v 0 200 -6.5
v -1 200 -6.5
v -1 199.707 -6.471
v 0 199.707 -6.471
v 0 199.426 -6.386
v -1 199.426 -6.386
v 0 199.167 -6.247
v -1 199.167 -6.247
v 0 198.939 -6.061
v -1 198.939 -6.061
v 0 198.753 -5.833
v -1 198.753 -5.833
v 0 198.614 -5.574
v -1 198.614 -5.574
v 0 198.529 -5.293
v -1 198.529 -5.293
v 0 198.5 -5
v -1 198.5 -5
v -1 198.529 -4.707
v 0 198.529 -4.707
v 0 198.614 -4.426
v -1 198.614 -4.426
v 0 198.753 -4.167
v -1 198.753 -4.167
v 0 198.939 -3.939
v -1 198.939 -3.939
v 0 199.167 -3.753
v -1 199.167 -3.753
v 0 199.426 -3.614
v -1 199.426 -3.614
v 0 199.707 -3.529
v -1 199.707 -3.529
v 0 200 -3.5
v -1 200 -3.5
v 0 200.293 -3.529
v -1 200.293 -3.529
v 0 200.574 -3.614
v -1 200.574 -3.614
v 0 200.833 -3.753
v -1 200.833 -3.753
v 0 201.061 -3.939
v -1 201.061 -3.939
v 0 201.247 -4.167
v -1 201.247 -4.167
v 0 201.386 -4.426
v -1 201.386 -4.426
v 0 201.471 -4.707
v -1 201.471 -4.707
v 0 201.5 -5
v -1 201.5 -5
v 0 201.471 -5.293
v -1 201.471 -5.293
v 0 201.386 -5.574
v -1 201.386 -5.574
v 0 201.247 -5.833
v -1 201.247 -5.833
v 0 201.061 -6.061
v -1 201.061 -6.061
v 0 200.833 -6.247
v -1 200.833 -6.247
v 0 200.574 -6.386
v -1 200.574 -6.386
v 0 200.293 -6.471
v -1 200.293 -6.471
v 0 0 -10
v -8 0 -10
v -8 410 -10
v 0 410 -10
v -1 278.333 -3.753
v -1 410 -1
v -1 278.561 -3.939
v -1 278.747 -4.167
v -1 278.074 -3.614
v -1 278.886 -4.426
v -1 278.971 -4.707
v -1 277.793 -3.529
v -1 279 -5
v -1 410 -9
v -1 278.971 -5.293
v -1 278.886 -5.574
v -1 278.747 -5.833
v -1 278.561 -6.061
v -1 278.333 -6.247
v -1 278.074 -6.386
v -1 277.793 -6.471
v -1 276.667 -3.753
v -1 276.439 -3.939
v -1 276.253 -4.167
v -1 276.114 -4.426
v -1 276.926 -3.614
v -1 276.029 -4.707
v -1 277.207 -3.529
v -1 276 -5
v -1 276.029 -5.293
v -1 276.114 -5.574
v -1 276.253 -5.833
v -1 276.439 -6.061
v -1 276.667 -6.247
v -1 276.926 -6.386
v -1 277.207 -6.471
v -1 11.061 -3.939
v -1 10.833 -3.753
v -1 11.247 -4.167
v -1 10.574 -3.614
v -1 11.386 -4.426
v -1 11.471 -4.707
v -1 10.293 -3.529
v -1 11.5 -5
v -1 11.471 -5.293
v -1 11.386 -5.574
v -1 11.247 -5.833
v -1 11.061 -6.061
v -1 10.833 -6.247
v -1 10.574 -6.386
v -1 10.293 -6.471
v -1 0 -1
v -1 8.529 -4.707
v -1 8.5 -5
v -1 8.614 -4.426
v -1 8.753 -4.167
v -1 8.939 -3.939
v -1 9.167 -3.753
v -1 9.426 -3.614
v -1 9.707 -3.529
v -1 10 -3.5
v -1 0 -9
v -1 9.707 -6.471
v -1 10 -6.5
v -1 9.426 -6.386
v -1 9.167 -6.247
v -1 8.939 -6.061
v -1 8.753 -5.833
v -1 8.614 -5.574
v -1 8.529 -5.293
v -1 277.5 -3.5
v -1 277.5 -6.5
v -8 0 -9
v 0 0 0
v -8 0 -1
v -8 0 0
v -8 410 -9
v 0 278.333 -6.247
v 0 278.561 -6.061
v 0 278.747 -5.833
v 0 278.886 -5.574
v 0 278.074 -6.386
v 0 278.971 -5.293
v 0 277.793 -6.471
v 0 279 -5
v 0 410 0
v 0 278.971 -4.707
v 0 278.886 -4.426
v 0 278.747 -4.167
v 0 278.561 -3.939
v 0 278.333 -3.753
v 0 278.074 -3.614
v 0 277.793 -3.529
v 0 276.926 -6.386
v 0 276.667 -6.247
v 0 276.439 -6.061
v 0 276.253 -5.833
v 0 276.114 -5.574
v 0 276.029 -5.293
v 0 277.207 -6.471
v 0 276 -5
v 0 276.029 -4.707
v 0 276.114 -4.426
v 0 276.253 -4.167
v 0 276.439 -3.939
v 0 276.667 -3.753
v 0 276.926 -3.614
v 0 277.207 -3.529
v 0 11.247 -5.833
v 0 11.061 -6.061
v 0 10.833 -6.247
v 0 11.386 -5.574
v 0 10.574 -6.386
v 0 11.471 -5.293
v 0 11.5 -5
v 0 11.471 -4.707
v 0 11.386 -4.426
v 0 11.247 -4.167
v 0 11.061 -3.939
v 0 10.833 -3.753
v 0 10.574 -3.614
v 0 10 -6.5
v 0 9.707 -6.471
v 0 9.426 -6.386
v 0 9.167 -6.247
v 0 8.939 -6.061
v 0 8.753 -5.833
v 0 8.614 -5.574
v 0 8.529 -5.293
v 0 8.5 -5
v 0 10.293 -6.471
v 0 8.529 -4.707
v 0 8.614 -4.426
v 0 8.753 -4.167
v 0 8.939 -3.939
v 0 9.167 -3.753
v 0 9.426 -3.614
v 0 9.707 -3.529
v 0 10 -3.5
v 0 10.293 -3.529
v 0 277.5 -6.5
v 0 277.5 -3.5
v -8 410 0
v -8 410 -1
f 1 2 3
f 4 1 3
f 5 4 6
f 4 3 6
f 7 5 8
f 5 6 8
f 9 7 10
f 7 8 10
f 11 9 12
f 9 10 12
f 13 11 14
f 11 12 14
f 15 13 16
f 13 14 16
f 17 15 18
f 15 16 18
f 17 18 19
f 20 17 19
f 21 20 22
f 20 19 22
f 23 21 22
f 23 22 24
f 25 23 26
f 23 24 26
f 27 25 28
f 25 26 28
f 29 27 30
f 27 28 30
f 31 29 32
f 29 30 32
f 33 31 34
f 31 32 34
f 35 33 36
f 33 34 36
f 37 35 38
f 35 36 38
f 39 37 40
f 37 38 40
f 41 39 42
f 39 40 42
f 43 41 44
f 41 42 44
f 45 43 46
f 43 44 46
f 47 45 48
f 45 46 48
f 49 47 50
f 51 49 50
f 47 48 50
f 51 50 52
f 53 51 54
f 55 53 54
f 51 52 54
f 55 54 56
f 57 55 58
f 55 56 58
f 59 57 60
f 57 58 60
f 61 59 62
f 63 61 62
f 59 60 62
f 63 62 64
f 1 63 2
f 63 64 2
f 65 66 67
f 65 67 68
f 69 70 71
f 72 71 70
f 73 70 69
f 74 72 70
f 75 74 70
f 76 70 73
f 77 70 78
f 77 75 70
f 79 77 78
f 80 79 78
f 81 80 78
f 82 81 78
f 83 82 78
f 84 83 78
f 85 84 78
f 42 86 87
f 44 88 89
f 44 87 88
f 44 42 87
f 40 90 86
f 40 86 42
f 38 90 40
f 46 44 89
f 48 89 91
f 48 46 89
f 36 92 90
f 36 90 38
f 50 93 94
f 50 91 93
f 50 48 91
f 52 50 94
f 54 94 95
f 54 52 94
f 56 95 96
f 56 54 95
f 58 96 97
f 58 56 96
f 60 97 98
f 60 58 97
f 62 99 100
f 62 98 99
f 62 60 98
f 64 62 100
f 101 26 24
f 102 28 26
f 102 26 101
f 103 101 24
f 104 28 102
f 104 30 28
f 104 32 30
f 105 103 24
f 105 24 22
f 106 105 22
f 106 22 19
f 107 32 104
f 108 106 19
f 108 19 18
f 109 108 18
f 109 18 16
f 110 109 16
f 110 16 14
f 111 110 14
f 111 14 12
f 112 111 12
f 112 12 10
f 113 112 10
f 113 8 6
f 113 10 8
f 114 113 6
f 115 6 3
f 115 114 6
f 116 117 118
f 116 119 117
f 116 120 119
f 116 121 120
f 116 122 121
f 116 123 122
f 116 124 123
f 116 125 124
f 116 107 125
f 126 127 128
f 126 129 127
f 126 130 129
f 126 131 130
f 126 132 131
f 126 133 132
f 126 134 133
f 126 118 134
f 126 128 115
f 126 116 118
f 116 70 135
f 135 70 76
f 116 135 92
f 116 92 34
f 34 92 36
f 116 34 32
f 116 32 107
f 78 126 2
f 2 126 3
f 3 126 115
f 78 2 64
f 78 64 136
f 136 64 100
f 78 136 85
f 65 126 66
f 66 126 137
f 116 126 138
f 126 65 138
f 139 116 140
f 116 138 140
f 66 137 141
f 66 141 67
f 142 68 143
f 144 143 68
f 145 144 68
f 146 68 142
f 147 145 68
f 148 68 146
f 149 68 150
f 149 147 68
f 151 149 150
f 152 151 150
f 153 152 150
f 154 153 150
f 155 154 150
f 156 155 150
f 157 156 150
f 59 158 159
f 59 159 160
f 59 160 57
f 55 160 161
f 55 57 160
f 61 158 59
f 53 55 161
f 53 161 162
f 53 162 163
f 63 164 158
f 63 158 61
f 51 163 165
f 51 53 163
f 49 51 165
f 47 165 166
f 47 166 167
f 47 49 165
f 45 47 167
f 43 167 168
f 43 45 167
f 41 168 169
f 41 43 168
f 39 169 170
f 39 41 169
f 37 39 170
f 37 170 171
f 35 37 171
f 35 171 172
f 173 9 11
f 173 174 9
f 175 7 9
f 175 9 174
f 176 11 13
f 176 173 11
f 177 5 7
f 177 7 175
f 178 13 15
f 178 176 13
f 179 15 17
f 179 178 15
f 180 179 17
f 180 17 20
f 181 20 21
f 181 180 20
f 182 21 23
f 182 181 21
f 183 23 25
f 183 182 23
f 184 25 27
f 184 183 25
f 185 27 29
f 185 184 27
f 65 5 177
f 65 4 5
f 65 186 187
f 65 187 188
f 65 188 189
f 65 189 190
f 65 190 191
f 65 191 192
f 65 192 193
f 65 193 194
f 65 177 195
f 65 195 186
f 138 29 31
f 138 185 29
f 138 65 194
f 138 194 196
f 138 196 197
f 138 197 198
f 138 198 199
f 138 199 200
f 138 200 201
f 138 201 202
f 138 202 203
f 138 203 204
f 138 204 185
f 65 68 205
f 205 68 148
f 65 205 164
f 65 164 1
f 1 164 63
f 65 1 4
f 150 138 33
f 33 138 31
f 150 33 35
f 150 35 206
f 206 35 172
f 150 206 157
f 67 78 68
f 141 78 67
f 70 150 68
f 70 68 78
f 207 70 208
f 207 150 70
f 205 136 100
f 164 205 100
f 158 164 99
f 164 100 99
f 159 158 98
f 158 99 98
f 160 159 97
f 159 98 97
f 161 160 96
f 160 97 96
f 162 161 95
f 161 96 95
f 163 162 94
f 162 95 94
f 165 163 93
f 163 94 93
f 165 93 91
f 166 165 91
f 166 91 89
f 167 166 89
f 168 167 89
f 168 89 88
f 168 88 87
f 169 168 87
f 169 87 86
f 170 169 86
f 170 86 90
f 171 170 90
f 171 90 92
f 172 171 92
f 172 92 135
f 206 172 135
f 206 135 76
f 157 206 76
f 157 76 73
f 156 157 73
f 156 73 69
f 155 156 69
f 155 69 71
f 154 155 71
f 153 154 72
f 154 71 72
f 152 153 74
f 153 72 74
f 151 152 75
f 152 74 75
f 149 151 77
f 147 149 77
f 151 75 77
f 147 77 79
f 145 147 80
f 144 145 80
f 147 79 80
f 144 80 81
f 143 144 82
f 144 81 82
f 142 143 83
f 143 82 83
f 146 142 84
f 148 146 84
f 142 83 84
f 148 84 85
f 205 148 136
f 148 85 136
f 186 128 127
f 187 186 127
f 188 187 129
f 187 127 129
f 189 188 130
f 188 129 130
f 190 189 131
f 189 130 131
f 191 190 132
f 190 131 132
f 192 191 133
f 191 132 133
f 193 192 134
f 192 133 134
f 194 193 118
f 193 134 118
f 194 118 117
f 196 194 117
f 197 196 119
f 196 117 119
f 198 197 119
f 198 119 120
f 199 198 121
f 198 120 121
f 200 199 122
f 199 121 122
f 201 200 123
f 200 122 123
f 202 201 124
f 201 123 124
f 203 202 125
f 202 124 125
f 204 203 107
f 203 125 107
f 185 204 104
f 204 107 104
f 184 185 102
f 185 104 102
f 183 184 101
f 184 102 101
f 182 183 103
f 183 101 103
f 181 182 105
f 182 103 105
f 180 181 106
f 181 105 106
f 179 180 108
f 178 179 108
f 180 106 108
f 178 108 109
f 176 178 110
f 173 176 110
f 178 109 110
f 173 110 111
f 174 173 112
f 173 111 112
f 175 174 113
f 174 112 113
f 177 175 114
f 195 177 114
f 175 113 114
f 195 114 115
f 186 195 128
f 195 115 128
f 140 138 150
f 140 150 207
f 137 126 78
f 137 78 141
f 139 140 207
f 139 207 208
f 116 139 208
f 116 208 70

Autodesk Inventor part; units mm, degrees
ref_plane "YZ Plane" through (0, 0, 0) normal (1, 0, 0) x (0, 1, 0)
ref_plane "XZ Plane" through (0, 0, 0) normal (0, 1, 0) x (-1, 0, 0)
ref_plane "XY Plane" through (0, 0, 0) normal (0, 0, 1) x (1, 0, 0)
sketch "Sketch1" plane through (0, 0, 0) normal (0, 1, 0) x (-1, 0, 0)
  line L0 (0, 0) -> (8, 0)
  line L1 (8, -10) -> (0, -10)
  line L2 (0, -10) -> (0, 0)
  line L3 (8, -1) -> (1, -1)
  line L4 (1, -1) -> (1, -9)
  line L5 (1, -9) -> (8, -9)
  line L6 (8, 0) -> (8, -1)
  line L7 (8, -9) -> (8, -10)
  dimension "d0" = 1
  dimension "d1" = 1
  dimension "d2" = 1
  dimension "d3" = 10
  dimension "d4" = 8
extrude "Extrusion1" add sketch "Sketch1" along normal blind 410
sketch "Sketch2" plane through (0, 0, 0) normal (1, 0, 0) x (0, 0, -1)
  line L0 (0, 0) -> (10, 0) projected
  line L1 (0, 0) -> (0, 410) projected
  point P0 (5, 10)
  dimension "d7" = 10
  dimension "d8" = 5
hole "Hole1" at (0, 10, -5) direction (-1, 0, 0) diameter 3 depth 8 tip angle 118
sketch "Sketch3" plane through (0, 0, 0) normal (1, 0, 0) x (0, 0, -1)
  line L0 (0, 0) -> (0, 410) projected
  line L1 (0, 410) -> (10, 410) projected
  point P0 (5, 277.5)
  point P1 (5, 410)
  dimension "d16" = 5
  dimension "d17" = 132.5
hole "Hole2" at (0, 277.5, -5) direction (-1, 0, 0) diameter 3 depth 8 tip angle 118
sketch "Sketch5" plane through (0, 0, 0) normal (1, 0, 0) x (0, 0, -1)
  line L0 (0, 0) -> (0, 410) projected
  circle A0 centre (5, 10) radius 1.5 projected
  point P0 (5, 200)
  dimension "d25" = 5
  dimension "d26" = 190
hole "Hole3" at (0, 200, -5) direction (-1, 0, 0) diameter 3 depth 8 tip angle 118
properties part number "Stringer" material "Aluminum"
